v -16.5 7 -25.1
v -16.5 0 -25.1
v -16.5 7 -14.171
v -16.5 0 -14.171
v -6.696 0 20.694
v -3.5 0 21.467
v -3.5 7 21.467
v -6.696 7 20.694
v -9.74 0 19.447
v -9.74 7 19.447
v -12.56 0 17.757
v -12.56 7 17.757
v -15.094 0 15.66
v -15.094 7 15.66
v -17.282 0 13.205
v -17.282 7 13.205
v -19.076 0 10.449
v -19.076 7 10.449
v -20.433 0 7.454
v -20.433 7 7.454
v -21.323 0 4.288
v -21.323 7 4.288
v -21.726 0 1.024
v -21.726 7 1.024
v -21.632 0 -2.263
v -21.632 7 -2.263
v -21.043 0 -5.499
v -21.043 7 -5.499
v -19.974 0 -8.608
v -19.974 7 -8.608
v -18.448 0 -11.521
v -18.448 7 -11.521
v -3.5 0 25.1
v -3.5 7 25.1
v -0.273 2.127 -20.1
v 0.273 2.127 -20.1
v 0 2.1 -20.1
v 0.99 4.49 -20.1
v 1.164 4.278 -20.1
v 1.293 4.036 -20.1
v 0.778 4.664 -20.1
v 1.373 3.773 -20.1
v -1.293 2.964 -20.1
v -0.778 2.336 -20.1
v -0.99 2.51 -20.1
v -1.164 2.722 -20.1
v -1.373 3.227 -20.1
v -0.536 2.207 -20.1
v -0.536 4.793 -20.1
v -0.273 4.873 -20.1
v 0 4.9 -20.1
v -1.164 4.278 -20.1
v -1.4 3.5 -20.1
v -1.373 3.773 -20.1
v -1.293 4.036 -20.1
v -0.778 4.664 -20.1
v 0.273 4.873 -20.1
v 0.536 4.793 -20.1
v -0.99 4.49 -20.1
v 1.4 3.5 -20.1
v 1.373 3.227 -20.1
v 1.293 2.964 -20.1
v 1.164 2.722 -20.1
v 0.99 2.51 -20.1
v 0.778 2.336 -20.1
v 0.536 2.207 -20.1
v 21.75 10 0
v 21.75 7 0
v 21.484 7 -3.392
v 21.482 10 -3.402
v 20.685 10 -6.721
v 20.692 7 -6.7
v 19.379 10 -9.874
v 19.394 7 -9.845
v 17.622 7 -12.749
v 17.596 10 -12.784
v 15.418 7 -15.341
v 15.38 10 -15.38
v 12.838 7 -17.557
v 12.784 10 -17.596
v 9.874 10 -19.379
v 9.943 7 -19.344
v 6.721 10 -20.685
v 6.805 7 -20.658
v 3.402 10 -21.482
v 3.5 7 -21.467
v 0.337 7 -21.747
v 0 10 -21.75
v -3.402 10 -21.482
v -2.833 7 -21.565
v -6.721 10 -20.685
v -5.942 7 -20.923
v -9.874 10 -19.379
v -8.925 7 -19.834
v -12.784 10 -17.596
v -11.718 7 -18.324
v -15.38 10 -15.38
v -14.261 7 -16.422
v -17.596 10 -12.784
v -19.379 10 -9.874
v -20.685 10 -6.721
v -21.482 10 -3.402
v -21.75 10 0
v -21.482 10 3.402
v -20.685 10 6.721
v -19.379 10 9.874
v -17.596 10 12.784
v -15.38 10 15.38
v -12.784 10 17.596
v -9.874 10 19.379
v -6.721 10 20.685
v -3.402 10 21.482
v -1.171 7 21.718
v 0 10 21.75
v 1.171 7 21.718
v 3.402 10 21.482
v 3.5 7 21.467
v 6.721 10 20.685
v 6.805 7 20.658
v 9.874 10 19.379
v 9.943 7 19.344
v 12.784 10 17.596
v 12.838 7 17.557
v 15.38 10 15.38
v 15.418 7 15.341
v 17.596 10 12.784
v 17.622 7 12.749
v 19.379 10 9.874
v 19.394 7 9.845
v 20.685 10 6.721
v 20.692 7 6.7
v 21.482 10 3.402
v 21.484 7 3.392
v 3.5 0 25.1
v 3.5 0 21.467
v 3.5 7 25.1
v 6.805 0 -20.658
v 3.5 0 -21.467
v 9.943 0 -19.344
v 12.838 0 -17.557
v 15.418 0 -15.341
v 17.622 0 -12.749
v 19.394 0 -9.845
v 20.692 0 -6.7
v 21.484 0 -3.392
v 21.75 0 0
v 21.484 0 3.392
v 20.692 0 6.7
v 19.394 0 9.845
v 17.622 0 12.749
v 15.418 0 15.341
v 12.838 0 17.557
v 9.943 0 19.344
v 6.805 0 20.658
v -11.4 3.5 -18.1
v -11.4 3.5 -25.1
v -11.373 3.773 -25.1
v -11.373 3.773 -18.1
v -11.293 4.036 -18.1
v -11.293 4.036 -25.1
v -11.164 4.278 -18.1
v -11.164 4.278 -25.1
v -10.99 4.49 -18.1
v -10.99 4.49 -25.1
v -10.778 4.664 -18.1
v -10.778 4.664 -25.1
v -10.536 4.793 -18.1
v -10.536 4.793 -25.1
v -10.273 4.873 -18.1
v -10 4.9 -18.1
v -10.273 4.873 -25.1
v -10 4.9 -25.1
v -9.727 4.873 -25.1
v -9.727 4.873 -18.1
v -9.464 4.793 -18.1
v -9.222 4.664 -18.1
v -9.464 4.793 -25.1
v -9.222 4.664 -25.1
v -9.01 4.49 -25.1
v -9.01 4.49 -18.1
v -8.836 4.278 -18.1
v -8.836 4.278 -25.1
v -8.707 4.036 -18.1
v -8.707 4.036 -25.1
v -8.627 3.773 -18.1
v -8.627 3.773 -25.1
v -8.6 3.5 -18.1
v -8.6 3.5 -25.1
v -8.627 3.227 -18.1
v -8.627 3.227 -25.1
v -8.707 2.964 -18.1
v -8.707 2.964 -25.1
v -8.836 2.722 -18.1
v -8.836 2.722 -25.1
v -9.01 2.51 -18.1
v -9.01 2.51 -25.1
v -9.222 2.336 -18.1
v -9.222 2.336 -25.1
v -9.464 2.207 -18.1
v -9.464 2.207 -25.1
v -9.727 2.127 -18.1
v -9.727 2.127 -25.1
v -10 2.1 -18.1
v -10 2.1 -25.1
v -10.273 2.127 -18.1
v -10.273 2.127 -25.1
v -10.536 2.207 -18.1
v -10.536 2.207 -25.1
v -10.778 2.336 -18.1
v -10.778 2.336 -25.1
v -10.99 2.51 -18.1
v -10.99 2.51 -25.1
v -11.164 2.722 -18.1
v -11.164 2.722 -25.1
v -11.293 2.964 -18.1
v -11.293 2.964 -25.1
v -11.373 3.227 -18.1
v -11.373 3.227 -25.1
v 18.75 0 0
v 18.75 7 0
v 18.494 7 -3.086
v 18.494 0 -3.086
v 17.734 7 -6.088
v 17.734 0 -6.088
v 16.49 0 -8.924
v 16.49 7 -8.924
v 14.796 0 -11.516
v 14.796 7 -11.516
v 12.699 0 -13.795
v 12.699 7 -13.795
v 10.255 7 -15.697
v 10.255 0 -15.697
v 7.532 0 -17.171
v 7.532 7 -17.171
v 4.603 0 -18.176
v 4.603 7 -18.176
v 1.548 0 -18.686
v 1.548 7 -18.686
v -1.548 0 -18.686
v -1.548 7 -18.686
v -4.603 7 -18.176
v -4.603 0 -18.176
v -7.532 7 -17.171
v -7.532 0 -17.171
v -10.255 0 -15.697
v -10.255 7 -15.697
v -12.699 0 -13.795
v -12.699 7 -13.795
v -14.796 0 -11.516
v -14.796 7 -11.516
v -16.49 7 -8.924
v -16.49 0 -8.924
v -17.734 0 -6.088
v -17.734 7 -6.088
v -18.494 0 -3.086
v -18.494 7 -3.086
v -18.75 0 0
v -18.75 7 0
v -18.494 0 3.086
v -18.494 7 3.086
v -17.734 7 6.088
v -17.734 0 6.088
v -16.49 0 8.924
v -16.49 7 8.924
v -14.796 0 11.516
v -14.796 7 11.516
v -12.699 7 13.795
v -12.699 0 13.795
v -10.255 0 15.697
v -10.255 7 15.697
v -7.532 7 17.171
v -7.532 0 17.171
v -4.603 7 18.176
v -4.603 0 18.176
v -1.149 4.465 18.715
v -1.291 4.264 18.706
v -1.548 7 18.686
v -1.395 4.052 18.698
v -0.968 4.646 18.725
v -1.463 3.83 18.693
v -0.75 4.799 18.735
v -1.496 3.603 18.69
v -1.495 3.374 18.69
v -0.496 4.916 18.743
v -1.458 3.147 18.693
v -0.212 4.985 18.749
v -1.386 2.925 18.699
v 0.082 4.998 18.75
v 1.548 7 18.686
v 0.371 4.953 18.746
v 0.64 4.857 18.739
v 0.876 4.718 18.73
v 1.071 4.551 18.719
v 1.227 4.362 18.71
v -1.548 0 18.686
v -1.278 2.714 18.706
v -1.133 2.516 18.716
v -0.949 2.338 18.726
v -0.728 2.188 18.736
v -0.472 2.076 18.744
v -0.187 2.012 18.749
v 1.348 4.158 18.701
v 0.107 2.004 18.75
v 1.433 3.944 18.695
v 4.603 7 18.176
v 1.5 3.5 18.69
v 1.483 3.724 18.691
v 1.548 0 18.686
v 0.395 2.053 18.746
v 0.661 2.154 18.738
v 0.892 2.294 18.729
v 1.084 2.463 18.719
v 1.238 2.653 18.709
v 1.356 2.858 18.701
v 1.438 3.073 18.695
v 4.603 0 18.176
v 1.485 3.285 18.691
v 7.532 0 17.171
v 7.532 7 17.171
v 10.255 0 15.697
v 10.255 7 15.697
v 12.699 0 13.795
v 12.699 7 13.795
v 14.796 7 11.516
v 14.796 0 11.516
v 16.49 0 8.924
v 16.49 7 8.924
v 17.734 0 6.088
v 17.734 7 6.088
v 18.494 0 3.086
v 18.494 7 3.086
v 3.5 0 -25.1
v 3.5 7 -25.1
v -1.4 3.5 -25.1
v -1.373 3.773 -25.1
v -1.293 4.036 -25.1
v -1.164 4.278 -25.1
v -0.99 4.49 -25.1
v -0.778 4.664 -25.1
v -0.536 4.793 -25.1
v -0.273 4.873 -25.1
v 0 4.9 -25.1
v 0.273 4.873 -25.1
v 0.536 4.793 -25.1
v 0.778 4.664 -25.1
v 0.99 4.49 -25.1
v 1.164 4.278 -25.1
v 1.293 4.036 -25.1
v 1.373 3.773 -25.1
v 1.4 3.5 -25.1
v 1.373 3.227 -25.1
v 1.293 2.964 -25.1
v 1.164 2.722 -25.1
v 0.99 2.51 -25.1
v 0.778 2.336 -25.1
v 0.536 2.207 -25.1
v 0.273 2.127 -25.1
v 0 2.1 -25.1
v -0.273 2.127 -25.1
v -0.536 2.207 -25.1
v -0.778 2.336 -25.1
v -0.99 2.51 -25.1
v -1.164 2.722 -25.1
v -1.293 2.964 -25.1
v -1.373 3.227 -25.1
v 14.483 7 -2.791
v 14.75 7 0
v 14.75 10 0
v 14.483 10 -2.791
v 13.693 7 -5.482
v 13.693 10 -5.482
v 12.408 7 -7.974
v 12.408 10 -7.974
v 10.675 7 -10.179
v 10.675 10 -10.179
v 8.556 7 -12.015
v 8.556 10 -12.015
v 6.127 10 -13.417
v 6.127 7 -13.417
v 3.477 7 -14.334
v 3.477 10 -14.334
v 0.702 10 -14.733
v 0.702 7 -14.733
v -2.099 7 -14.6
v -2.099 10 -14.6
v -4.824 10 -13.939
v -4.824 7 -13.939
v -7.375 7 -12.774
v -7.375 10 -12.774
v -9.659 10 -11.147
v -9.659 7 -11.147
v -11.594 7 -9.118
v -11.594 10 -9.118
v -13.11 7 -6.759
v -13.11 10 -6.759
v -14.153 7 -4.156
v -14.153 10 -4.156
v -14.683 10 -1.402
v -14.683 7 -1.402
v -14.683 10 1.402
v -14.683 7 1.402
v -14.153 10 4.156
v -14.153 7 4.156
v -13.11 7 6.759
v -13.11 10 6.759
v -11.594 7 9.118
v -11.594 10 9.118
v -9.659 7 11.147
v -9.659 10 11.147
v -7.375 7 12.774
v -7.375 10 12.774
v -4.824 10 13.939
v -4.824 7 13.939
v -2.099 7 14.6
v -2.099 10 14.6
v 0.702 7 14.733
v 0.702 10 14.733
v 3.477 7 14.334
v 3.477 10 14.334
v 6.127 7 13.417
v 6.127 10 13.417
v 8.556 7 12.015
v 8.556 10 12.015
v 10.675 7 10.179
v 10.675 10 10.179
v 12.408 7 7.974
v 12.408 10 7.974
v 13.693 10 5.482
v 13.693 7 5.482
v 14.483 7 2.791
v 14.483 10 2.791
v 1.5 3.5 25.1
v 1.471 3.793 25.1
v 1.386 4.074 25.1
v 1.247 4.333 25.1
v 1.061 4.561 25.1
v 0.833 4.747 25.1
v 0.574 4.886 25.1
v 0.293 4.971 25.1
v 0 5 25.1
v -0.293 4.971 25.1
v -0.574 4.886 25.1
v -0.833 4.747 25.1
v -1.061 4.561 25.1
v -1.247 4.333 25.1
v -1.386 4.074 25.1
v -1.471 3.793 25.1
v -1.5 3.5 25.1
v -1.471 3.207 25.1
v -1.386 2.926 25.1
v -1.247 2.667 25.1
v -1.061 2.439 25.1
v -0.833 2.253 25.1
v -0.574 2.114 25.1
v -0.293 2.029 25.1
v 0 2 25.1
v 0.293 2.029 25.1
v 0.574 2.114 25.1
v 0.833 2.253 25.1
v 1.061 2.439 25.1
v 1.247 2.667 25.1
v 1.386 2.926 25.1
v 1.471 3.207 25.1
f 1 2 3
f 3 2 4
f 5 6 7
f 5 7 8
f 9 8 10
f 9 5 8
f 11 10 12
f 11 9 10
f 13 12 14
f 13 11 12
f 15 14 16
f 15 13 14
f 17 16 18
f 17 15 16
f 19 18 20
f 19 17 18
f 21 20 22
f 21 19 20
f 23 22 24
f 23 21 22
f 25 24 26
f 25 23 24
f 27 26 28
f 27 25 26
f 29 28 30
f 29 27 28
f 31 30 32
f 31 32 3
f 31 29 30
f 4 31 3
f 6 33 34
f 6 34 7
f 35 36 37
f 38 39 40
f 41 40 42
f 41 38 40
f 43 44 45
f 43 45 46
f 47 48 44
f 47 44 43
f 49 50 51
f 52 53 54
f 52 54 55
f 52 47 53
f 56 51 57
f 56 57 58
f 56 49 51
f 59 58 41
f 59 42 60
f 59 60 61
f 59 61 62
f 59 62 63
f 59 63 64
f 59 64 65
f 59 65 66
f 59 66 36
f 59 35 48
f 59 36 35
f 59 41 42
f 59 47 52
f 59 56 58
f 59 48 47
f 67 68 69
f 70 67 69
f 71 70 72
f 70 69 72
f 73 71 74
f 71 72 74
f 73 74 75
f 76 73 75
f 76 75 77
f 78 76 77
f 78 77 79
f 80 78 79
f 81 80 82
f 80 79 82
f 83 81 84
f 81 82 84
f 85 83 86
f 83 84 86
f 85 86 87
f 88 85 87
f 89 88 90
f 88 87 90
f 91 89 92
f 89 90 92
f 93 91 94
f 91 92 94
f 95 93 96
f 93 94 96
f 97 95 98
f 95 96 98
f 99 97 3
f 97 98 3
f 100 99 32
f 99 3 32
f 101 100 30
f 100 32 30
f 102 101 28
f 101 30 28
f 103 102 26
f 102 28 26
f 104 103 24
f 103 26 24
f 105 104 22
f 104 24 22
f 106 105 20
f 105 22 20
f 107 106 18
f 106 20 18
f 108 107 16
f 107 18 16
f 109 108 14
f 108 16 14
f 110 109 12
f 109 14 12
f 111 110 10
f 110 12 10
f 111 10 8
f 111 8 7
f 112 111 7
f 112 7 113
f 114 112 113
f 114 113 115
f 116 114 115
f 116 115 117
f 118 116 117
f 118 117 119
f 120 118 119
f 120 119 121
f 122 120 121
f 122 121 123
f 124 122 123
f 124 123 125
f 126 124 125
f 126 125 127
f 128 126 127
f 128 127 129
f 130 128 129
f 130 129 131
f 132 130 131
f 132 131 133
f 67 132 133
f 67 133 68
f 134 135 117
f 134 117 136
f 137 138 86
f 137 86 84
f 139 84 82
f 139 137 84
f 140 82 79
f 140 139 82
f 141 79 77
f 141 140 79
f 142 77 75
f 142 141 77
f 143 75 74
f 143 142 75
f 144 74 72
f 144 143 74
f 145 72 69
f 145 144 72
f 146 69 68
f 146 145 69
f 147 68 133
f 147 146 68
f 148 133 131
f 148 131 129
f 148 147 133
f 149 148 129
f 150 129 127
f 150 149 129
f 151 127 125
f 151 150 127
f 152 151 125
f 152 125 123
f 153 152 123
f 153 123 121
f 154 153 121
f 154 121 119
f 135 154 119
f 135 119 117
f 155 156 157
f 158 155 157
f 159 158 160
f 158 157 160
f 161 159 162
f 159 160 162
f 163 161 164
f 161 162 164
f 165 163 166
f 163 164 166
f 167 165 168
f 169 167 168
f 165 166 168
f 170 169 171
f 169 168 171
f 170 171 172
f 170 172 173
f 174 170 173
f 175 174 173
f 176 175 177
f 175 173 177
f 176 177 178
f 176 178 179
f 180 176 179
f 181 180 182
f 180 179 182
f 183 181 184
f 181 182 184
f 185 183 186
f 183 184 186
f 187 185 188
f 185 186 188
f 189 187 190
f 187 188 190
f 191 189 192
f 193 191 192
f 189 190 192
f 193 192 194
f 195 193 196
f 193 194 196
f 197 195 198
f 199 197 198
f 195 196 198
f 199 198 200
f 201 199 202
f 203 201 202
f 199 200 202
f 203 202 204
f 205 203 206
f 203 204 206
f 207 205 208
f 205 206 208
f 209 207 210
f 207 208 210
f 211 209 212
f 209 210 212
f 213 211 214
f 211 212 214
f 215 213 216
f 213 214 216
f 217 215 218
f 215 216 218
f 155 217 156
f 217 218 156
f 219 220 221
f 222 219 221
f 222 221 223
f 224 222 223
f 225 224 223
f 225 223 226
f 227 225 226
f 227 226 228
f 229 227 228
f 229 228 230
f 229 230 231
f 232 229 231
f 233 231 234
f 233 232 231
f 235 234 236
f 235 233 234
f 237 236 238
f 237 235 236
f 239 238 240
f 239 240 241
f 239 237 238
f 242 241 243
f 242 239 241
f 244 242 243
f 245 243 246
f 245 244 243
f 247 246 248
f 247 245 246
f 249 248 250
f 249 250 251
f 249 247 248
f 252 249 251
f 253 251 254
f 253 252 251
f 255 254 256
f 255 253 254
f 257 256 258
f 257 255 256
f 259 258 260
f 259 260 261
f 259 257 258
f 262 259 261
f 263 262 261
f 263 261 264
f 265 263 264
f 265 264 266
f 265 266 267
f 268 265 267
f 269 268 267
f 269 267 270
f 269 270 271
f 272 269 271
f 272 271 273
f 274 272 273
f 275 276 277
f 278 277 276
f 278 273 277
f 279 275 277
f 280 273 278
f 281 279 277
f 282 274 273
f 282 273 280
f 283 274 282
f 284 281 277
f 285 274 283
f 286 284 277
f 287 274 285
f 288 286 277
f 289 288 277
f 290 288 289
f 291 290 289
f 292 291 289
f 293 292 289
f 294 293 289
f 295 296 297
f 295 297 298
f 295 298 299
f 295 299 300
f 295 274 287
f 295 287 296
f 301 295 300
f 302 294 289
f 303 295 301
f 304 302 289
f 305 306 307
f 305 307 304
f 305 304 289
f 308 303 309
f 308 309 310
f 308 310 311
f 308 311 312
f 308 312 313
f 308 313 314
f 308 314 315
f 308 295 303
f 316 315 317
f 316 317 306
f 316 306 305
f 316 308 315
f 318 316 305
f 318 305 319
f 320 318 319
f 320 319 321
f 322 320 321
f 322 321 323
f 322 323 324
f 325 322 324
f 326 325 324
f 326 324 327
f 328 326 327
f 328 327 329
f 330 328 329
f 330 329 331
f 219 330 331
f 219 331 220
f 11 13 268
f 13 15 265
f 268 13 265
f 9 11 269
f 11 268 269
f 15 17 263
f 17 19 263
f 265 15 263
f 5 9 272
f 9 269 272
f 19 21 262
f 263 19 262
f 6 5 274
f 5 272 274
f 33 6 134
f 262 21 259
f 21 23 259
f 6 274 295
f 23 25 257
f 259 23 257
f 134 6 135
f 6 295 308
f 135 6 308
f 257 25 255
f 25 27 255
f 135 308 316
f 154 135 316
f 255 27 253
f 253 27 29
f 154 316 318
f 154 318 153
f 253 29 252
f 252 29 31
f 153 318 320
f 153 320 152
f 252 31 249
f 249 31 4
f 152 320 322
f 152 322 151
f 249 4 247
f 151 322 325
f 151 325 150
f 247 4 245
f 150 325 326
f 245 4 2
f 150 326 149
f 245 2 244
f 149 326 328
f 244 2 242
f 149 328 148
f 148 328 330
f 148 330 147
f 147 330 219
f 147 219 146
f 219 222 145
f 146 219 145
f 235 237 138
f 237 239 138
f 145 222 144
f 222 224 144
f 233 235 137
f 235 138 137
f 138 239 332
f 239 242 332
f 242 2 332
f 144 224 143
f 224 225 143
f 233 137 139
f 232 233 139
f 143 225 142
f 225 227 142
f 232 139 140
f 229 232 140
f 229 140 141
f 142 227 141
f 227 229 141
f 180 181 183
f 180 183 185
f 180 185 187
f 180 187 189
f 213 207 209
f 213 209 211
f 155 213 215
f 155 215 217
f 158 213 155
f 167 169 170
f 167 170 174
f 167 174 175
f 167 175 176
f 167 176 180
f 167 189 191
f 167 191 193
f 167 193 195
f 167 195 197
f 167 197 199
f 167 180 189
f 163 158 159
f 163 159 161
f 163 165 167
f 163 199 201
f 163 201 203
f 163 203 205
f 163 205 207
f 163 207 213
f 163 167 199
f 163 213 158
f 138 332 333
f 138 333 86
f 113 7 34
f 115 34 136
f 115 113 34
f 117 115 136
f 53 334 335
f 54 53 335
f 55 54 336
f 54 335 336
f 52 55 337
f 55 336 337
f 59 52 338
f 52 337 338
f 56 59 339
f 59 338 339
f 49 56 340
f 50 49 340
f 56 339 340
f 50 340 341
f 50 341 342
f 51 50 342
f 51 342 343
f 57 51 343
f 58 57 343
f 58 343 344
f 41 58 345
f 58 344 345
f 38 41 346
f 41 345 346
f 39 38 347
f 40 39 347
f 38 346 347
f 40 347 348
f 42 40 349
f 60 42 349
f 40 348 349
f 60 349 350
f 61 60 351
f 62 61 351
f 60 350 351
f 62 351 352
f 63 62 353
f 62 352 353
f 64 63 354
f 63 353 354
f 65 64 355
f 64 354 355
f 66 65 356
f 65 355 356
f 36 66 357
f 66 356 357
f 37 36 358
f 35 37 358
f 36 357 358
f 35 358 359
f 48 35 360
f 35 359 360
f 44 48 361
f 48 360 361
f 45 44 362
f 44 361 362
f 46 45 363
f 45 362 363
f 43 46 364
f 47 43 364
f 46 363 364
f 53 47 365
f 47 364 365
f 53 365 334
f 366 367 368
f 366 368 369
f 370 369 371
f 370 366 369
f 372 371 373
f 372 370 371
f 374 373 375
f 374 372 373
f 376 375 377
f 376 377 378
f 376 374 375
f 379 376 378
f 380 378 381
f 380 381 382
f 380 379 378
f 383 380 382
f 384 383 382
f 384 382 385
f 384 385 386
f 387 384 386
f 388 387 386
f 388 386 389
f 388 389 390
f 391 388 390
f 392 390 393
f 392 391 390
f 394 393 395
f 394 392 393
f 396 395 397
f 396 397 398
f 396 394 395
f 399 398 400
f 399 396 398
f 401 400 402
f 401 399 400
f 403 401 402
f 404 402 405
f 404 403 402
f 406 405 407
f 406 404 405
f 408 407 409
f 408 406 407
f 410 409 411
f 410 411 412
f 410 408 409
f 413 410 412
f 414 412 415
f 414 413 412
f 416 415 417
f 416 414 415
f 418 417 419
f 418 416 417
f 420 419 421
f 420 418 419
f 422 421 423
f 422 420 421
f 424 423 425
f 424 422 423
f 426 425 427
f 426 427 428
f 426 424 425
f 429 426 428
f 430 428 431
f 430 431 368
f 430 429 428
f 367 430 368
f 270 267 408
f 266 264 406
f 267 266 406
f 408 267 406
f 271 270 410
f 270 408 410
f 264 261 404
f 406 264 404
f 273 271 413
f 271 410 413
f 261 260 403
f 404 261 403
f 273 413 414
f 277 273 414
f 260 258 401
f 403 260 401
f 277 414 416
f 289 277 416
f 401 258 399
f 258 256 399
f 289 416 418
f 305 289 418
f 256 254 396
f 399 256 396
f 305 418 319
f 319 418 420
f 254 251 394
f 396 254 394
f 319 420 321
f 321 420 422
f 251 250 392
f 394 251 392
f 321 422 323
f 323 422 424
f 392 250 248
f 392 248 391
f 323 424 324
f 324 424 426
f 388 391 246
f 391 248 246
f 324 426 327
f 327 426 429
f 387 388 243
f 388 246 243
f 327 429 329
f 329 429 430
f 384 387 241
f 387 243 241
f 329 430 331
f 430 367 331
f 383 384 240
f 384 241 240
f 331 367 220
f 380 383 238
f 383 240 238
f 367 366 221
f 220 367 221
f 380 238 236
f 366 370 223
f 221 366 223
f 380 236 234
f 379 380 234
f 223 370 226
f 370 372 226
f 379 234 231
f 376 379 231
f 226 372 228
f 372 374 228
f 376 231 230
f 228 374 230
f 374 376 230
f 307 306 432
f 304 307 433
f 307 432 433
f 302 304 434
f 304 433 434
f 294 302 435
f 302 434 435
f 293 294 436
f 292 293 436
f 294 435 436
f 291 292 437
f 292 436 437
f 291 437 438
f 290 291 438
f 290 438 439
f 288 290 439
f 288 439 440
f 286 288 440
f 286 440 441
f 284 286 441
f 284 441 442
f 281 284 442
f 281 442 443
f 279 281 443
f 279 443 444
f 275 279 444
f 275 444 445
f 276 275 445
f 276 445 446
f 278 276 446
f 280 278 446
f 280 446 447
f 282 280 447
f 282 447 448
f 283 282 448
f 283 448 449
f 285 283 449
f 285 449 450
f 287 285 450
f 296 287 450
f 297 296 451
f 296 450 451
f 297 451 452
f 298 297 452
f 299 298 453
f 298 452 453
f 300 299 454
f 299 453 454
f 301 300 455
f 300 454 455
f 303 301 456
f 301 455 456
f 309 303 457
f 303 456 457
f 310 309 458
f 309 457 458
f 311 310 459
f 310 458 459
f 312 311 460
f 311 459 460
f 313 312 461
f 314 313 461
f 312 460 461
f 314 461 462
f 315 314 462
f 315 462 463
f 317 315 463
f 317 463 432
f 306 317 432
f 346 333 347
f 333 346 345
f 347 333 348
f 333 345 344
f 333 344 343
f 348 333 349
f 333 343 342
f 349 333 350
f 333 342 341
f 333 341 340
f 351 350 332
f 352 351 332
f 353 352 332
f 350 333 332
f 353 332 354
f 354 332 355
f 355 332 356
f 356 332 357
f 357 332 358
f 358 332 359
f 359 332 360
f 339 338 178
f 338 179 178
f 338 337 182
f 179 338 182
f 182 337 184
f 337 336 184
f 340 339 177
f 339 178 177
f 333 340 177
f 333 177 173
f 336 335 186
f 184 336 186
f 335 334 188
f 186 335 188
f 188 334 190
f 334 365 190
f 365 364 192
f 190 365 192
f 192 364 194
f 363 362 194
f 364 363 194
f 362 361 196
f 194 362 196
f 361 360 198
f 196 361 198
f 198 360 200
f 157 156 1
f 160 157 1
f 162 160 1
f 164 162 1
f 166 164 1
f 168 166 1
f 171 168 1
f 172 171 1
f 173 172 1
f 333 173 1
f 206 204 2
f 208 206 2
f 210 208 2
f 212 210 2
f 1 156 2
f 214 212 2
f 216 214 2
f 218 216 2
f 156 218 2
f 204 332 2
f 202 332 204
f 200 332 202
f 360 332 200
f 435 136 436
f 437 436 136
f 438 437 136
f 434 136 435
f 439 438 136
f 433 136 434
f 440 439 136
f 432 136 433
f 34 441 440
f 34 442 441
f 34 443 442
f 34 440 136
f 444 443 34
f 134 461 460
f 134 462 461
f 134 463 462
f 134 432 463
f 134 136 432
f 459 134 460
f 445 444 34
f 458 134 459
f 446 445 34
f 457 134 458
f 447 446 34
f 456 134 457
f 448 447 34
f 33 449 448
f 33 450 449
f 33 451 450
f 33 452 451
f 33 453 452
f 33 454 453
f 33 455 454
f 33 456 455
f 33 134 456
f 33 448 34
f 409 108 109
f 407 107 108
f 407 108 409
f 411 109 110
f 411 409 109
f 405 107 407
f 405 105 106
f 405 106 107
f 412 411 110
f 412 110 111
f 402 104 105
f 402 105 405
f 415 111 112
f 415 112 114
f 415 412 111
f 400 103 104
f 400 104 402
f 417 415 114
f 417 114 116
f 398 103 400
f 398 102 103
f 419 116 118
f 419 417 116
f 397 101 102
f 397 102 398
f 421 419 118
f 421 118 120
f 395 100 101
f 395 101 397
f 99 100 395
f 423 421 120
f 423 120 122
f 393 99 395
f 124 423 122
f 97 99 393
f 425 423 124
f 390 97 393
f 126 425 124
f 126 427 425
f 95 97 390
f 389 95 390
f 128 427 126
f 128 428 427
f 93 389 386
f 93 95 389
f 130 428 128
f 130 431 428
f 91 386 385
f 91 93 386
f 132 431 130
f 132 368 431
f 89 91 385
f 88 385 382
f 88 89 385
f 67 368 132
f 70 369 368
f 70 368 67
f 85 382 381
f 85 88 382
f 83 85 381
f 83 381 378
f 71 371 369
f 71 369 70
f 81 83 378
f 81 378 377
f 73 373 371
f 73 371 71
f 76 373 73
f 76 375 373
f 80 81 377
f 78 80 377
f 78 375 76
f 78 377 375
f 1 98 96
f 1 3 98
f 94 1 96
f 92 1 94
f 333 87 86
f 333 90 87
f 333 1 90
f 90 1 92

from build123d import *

# Parameters (mm, degrees)
SKETCH1_R           = 18.75
BOSS_EXTRUDE1_DEPTH = 7
SKETCH2_R           = 1.5
CUT_EXTRUDE1_DEPTH  = 7
SKETCH3_R           = 1.4
CUT_EXTRUDE2_DEPTH  = 5
BOSS_EXTRUDE3_DEPTH = 7
SKETCH7_R           = 1.4
CUT_EXTRUDE3_DEPTH  = 7
SKETCH9_R           = 21.75
SKETCH9_R_2         = 14.75
BOSS_EXTRUDE5_DEPTH = 3


with BuildPart() as part:
    # Sketch1 → Boss-Extrude1 (new body)
    with BuildSketch(Plane(origin=(0, 0, 0), x_dir=(1, 0, 0), z_dir=(0, 1, 0))):
        with BuildLine():
            Line((3.5, -25.1), (-3.5, -25.1))
            Line((-3.5, -25.1), (-3.5, -21.466544))
            ThreePointArc((-3.5, -21.466544), (-21.75, 0), (-3.5, 21.466544))
            Line((-3.5, 21.466544), (-3.5, 25.1))
            Line((-3.5, 25.1), (3.5, 25.1))
            Line((3.5, 25.1), (3.5, 21.466544))
            ThreePointArc((3.5, 21.466544), (21.75, 0), (3.5, -21.466544))
            Line((3.5, -21.466544), (3.5, -25.1))
        make_face()
        Circle(SKETCH1_R, mode=Mode.SUBTRACT)
    extrude(amount=BOSS_EXTRUDE1_DEPTH)

    # Sketch2 → Cut-Extrude1 (cut)
    with BuildSketch(Plane.XY.offset(25.1)):
        with Locations((0, 3.5)):
            Circle(SKETCH2_R)
    extrude(amount=-CUT_EXTRUDE1_DEPTH, mode=Mode.SUBTRACT)

    # Sketch3 → Cut-Extrude2 (cut)
    with BuildSketch(Plane(origin=(0, 0, -25.1), x_dir=(-1, 0, 0), z_dir=(0, 0, -1))):
        with Locations((0, 3.5)):
            Circle(SKETCH3_R)
    extrude(amount=-CUT_EXTRUDE2_DEPTH, mode=Mode.SUBTRACT)

    # Sketch6 → Boss-Extrude3 (add)
    with BuildSketch(Plane(origin=(0, 0, 0), x_dir=(-1, 0, 0), z_dir=(0, -1, 0))):
        with BuildLine():
            Line((3.5, 25.1), (16.5, 25.1))
            Line((16.5, 25.1), (16.5, 14.170833))
            ThreePointArc((16.5, 14.170833), (10.644569, 18.967226), (3.5, 21.466544))
            Line((3.5, 21.466544), (3.5, 25.1))
        make_face()
    extrude(amount=-BOSS_EXTRUDE3_DEPTH)

    # Sketch7 → Cut-Extrude3 (cut)
    with BuildSketch(Plane(origin=(0, 0, -25.1), x_dir=(-1, 0, 0), z_dir=(0, 0, -1))):
        with Locations((10, 3.5)):
            Circle(SKETCH7_R)
    extrude(amount=-CUT_EXTRUDE3_DEPTH, mode=Mode.SUBTRACT)

    # Sketch9 → Boss-Extrude5 (add)
    with BuildSketch(Plane(origin=(0, 7, 0), x_dir=(1, 0, 0), z_dir=(0, 1, 0))):
        Circle(SKETCH9_R)
        Circle(SKETCH9_R_2, mode=Mode.SUBTRACT)
    extrude(amount=BOSS_EXTRUDE5_DEPTH)


solid = part.part
